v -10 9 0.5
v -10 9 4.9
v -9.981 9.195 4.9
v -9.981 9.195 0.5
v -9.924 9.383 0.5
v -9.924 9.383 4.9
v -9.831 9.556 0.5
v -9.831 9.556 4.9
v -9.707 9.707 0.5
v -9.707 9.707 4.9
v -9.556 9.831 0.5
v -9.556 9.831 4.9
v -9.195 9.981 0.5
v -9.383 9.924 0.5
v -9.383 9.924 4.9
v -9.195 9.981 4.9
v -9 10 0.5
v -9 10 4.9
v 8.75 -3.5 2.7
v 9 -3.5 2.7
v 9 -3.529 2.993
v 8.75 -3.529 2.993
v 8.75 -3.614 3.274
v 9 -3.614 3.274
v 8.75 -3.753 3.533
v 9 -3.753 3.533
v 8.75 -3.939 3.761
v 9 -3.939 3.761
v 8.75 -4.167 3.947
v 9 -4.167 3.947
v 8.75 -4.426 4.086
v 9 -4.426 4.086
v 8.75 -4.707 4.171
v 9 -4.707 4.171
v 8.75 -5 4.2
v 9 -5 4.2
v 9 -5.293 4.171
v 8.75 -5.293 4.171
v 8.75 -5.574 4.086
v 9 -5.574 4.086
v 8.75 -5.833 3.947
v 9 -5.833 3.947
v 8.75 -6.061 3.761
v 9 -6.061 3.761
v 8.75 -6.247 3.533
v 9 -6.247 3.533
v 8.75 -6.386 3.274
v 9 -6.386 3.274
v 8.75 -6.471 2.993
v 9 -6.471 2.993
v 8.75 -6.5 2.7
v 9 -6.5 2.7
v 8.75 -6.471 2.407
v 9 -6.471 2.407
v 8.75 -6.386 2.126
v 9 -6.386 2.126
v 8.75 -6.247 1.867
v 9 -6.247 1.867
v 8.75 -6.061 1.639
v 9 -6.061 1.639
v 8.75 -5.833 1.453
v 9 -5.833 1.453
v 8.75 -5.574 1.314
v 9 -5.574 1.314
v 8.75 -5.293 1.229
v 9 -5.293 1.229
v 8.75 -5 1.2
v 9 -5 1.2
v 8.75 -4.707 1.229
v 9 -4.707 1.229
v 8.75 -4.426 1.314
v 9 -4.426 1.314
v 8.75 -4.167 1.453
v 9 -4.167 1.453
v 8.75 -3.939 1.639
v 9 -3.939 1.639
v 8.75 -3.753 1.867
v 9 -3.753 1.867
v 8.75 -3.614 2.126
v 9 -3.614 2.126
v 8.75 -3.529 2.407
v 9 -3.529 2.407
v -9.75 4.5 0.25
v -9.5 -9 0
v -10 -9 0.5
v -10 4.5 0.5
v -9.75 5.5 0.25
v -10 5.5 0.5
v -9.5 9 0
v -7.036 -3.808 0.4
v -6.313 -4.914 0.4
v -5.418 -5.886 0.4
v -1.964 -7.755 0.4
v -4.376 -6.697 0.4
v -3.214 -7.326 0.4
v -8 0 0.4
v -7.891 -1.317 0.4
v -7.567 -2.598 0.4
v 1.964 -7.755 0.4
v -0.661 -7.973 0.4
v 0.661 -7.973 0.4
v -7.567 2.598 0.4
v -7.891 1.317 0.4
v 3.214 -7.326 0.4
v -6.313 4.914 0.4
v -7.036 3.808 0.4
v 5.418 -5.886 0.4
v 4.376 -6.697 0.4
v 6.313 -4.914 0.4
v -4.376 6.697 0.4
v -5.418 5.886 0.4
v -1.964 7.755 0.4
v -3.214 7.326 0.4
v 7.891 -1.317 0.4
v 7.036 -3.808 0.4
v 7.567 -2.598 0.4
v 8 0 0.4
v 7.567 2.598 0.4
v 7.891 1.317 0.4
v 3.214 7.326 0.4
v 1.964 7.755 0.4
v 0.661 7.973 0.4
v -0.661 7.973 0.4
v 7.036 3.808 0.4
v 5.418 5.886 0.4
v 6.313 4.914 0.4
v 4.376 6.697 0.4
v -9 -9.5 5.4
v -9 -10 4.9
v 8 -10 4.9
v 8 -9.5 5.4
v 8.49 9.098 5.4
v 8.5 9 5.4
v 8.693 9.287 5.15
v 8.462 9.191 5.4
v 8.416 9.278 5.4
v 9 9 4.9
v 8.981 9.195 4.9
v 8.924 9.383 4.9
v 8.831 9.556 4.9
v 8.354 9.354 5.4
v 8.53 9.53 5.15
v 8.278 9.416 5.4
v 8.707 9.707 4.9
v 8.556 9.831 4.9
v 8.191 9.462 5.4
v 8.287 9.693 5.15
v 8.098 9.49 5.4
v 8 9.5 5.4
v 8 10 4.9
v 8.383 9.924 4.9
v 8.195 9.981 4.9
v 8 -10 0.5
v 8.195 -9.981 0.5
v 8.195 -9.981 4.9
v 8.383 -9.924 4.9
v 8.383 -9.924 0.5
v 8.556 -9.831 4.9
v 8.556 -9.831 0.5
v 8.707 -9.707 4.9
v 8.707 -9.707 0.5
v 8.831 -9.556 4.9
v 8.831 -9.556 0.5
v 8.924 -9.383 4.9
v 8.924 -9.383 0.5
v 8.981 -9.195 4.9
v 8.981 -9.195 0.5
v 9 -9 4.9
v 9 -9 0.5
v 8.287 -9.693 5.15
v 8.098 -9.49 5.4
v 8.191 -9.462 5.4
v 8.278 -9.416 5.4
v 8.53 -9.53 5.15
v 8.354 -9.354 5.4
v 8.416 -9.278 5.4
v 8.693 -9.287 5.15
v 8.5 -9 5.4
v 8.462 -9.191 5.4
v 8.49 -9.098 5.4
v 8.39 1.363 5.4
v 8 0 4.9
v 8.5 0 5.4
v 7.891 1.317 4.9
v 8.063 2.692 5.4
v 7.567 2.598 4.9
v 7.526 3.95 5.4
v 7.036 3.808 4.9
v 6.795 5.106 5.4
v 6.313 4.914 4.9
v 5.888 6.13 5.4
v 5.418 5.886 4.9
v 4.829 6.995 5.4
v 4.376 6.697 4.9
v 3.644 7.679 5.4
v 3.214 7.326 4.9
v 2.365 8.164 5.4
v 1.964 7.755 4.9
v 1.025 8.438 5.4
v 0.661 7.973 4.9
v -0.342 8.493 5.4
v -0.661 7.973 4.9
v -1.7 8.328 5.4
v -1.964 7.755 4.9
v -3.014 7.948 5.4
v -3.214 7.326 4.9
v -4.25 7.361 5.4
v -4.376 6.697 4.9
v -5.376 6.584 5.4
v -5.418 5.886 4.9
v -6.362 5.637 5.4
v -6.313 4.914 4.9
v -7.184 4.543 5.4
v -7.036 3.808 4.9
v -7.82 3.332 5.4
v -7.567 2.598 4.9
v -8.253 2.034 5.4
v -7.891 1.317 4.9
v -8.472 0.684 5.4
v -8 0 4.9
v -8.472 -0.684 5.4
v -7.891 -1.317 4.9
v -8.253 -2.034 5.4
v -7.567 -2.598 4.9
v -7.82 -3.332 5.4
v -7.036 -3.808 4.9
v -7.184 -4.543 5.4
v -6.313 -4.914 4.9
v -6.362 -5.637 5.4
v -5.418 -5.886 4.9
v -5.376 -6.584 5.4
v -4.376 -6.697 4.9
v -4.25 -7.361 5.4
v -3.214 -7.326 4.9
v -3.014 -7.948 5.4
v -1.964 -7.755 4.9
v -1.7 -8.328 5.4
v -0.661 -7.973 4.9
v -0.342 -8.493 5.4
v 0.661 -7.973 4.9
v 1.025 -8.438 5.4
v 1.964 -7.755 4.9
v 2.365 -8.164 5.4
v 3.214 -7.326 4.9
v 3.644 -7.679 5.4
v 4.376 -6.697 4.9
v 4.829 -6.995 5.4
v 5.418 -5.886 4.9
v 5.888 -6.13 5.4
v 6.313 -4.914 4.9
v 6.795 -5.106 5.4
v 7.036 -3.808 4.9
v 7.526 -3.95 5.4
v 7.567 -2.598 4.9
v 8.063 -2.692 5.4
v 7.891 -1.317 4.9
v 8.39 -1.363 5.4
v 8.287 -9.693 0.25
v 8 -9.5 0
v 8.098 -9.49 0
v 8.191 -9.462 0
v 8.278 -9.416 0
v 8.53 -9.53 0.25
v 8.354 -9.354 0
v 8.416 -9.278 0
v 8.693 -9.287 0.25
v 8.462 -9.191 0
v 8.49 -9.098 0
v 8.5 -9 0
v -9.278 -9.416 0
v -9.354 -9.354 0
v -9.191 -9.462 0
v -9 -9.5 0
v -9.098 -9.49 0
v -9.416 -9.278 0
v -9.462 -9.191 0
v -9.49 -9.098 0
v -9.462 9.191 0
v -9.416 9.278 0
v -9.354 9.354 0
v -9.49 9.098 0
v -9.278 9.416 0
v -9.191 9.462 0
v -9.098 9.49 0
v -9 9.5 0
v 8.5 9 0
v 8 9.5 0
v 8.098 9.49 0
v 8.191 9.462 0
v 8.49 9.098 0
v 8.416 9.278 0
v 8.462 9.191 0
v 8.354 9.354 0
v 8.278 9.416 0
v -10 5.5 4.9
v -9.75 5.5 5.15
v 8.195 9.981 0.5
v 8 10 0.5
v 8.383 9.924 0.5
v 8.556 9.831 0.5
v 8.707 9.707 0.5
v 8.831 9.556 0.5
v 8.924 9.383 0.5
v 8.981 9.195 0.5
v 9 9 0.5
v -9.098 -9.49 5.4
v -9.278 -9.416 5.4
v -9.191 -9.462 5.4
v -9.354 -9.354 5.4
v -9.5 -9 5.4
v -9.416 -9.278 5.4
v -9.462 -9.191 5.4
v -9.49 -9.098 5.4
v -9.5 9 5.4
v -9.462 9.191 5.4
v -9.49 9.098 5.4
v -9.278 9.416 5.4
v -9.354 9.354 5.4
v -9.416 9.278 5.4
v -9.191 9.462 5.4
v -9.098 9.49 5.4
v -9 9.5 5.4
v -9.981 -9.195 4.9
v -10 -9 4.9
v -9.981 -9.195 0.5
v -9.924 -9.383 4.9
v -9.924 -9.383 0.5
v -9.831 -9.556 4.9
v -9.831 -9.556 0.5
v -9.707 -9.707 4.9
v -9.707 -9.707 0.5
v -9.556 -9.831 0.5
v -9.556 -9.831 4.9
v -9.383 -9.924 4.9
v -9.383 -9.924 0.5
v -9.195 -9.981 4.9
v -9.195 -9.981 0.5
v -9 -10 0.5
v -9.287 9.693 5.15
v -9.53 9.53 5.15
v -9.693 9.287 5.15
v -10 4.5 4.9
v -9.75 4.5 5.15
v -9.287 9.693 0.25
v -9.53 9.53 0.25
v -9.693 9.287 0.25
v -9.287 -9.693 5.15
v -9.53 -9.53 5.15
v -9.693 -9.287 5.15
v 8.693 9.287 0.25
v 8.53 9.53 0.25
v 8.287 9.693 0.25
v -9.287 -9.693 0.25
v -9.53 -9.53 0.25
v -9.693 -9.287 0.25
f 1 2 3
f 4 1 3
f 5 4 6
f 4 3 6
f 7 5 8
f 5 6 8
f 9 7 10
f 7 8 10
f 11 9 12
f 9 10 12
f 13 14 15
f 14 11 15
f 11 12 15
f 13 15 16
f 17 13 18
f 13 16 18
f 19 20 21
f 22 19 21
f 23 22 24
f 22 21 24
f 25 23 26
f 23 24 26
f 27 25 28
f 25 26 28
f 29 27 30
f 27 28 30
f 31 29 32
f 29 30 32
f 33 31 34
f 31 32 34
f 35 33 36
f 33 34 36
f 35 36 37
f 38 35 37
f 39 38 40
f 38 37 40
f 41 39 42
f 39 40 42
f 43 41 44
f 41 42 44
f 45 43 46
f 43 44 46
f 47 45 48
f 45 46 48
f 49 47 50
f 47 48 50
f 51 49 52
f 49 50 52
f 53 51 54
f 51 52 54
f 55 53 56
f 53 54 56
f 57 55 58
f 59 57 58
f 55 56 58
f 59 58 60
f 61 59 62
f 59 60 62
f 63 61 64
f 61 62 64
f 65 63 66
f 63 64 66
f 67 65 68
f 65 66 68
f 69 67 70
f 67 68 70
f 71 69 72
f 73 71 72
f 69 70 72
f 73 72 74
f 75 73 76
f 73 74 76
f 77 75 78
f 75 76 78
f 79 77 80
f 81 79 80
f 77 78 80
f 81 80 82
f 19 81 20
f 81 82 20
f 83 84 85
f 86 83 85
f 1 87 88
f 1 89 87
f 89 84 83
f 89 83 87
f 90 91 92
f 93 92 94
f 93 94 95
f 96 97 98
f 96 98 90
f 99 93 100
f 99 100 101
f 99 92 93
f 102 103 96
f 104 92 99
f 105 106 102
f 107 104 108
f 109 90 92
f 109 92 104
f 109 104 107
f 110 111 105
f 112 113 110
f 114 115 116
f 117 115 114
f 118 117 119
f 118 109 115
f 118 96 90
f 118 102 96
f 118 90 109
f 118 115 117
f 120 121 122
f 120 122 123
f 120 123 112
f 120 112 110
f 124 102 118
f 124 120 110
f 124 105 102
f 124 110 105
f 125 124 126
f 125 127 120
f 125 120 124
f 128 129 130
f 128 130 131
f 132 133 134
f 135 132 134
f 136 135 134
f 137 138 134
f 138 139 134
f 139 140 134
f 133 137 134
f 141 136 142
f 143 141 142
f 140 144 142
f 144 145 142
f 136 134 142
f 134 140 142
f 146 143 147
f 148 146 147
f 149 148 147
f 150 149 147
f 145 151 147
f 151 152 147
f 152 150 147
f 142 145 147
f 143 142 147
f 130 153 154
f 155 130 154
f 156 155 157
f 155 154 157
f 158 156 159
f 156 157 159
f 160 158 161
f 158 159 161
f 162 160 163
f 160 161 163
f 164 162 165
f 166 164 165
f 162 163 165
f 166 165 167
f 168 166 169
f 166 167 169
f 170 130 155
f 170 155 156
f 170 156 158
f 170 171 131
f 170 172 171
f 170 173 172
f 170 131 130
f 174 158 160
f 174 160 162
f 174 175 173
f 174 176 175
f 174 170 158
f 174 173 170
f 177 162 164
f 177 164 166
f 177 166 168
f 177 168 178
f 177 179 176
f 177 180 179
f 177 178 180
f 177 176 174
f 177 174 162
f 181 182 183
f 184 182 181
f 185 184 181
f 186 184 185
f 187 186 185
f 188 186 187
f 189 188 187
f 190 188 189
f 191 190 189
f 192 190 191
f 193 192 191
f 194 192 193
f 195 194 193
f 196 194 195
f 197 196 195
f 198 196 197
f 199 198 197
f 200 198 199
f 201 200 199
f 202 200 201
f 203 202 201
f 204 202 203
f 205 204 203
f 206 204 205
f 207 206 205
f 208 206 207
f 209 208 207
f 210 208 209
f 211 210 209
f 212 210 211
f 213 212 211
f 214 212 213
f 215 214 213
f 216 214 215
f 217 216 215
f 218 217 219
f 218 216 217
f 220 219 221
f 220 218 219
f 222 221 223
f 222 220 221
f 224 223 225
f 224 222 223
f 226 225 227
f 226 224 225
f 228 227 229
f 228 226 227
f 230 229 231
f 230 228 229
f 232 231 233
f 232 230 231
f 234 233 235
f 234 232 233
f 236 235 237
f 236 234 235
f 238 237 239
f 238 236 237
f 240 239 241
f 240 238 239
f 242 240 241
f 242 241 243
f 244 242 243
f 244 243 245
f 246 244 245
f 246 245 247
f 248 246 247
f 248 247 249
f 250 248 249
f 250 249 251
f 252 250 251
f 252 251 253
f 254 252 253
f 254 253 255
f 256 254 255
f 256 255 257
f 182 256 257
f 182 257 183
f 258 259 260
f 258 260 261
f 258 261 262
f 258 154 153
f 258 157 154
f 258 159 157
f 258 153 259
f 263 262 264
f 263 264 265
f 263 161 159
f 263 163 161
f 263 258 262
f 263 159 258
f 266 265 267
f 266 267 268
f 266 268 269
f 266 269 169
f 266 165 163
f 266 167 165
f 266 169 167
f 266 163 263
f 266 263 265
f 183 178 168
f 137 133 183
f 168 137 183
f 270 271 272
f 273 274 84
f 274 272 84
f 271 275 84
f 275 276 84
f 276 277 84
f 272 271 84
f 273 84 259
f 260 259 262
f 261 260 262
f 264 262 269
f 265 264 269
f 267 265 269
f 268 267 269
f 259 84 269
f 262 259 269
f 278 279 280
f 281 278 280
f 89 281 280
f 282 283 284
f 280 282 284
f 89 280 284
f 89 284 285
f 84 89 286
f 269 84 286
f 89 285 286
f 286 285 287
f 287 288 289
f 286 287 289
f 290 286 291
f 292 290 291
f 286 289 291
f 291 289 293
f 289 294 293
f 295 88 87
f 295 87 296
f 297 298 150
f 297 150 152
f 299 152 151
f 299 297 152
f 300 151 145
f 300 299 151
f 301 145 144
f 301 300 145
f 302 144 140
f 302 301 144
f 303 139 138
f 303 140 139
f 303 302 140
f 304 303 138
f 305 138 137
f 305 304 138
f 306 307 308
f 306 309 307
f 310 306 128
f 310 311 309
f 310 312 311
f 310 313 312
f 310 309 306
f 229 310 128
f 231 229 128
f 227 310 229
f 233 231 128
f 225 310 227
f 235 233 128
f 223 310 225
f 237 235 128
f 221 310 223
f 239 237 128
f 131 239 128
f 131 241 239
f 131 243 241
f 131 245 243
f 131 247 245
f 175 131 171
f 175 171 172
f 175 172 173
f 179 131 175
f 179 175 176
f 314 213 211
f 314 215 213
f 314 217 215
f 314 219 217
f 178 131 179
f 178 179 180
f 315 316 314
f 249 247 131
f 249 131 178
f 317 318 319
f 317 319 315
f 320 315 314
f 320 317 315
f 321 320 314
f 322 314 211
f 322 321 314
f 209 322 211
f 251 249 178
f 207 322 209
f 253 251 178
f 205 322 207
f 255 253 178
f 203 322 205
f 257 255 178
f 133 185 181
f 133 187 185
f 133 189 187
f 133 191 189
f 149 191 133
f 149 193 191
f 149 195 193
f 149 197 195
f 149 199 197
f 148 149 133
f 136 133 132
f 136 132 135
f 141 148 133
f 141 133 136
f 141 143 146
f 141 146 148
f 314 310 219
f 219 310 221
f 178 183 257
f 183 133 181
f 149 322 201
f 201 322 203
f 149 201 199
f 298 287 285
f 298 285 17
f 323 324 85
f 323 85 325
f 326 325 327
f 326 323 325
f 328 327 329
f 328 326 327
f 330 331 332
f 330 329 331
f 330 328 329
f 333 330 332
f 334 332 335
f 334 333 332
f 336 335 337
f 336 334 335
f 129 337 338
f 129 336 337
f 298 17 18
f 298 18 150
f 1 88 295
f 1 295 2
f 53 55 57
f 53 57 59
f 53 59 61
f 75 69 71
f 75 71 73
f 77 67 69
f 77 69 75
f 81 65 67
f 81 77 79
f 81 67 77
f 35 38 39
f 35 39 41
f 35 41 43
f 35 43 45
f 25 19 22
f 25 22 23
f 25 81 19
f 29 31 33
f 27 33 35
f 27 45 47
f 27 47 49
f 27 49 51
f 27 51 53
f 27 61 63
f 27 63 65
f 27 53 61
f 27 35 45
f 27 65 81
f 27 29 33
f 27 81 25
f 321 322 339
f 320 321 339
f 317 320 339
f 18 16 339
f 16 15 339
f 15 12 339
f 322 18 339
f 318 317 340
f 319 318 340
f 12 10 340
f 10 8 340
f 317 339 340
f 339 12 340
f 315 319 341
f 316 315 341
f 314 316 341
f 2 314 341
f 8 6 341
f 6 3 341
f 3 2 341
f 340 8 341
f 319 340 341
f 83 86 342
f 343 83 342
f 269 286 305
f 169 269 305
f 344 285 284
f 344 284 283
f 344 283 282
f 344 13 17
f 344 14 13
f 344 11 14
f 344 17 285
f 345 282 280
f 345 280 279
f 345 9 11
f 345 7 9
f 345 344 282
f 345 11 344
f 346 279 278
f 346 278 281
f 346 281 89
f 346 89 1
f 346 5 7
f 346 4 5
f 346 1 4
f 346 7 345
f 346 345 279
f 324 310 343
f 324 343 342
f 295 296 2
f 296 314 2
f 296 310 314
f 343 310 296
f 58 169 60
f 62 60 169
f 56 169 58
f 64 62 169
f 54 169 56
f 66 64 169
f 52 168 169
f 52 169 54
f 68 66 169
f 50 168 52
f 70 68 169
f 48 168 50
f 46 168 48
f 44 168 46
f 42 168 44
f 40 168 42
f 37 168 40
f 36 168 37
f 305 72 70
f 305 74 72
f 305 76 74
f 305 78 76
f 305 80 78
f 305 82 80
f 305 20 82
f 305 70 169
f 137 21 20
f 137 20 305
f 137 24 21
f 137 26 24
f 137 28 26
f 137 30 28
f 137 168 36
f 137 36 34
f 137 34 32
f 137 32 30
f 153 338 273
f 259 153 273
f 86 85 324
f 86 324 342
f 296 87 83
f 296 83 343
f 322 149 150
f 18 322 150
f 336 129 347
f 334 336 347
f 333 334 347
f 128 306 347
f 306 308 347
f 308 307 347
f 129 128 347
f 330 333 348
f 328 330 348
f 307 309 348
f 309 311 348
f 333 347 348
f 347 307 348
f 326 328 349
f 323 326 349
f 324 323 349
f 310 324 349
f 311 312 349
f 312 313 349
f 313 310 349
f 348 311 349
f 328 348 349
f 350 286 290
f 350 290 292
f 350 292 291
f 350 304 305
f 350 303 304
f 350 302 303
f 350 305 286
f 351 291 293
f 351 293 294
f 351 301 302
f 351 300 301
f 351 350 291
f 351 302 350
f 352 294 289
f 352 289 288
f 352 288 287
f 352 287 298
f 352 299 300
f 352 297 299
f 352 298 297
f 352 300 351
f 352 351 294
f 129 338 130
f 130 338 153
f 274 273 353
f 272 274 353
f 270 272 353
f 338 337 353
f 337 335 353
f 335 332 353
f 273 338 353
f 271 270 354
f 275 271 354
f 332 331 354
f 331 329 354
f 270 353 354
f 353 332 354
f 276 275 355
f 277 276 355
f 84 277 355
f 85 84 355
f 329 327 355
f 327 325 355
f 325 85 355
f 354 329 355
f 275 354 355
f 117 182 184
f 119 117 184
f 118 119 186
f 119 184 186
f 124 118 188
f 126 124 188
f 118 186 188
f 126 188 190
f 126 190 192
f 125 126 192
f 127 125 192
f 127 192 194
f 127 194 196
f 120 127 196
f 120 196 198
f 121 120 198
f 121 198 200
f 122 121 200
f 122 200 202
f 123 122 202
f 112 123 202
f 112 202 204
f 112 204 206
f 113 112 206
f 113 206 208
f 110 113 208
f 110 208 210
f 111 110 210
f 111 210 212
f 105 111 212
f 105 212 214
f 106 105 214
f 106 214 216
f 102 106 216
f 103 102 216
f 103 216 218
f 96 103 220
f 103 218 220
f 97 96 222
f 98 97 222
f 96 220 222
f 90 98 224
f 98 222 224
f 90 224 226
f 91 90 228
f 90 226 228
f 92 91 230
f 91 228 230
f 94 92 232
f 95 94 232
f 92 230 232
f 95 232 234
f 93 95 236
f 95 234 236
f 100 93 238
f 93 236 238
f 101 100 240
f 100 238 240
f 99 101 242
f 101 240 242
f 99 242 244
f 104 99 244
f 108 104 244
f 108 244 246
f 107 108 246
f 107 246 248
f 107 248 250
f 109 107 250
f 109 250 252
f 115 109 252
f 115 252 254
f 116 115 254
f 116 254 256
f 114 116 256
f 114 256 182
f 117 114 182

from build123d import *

# Parameters (mm, degrees)
SKETCH1_W           = 20
SKETCH1_H           = 20
BOSS_EXTRUDE1_DEPTH = 5.4
SKETCH2_R           = 8
CUT_EXTRUDE1_DEPTH  = 5
SKETCH4_W           = 1
SKETCH4_H           = 20
CUT_EXTRUDE3_DEPTH  = 10
SKETCH3_R           = 1.5
CUT_EXTRUDE2_DEPTH  = 0.25
SKETCH5_W           = 5.4
SKETCH5_H           = 1
CUT_EXTRUDE4_DEPTH  = 0.25
FILLET1_R           = 1
CHAMFER1_SIZE       = 0.5


with BuildPart() as part:
    # Sketch1 → Boss-Extrude1 (new body)
    with BuildSketch(Plane.XY):
        Rectangle(SKETCH1_W, SKETCH1_H)
    extrude(amount=BOSS_EXTRUDE1_DEPTH)

    # Sketch2 → Cut-Extrude1 (cut)
    with BuildSketch(Plane.XY.offset(5.4)):
        Circle(SKETCH2_R)
    extrude(amount=-CUT_EXTRUDE1_DEPTH, mode=Mode.SUBTRACT)

    # Sketch4 → Cut-Extrude3 (cut)
    with BuildSketch(Plane.XY.offset(5.4)):
        with Locations((9.5, 0)):
            Rectangle(SKETCH4_W, SKETCH4_H)
    extrude(amount=-CUT_EXTRUDE3_DEPTH, mode=Mode.SUBTRACT)

    # Sketch3 → Cut-Extrude2 (cut)
    with BuildSketch(Plane(origin=(9, 0, 0), x_dir=(0, 0, -1), z_dir=(1, 0, 0))):
        with Locations(Location((-2.7, -5, 0), (0, 0, 90))):
            Circle(SKETCH3_R)
    extrude(amount=-CUT_EXTRUDE2_DEPTH, mode=Mode.SUBTRACT)

    # Sketch5 → Cut-Extrude4 (cut)
    with BuildSketch(Plane.ZY.offset(10)):
        with Locations((2.7, 5)):
            Rectangle(SKETCH5_W, SKETCH5_H)
    extrude(amount=-CUT_EXTRUDE4_DEPTH, mode=Mode.SUBTRACT)

    # Fillet1
    fillet1_edges = [part.edges().sort_by_distance(p)[0] for p in [
        (9, -10, 2.7),
        (9, 10, 2.7),
        (-10, -10, 2.7),
        (-10, 10, 2.7),
    ]]
    fillet(fillet1_edges, radius=FILLET1_R)

    # Chamfer1
    # the kernel refuses this chamfer: 0.5 mm, written as the material it takes off along each edge
    with BuildSketch(Plane(origin=(8, 10, 0), x_dir=(0, -0.9996219169112968, -0.02749587661058639), z_dir=(-1, 0, 0)), Plane(origin=(-9, -10, 5.4), x_dir=(0, -0.027495876610585647, -0.9996219169112968), z_dir=(1, 0, 0))) as chamfer1_piece_1:
        Polygon((CHAMFER1_SIZE * 0.999621916911, CHAMFER1_SIZE * 0.0274958766106), (-CHAMFER1_SIZE * 0.0274958766106, CHAMFER1_SIZE * 0.999621916911), (0, 0), align=None)
    extrude(amount=17, mode=Mode.SUBTRACT)
    with BuildSketch(Plane(origin=(-9, 9, 0), x_dir=(0, 1, 0), z_dir=(1, 0, 0))) as chamfer1_piece_2:
        Polygon((1 - CHAMFER1_SIZE, 0), (1, CHAMFER1_SIZE), (1, 0), align=None)
    revolve(axis=Axis((-9, 9, 0), (0, 0, 1)), revolution_arc=90, mode=Mode.SUBTRACT)
    with BuildSketch(Plane(origin=(-10, 5.785841494, 0), x_dir=(0.9996219169112968, 0, -0.02749587661058639), z_dir=(0, -1, 0))) as chamfer1_piece_3:
        Polygon((CHAMFER1_SIZE * 0.999621916911, CHAMFER1_SIZE * 0.0274958766106), (-CHAMFER1_SIZE * 0.0274958766106, CHAMFER1_SIZE * 0.999621916911), (0, 0), align=None)
    extrude(amount=14.785841494, mode=Mode.SUBTRACT)
    with BuildSketch(Plane(origin=(-10, 9, 0), x_dir=(0.9996219169112968, 0, -0.02749587661058639), z_dir=(0, -1, 0))) as chamfer1_piece_4:
        Polygon((CHAMFER1_SIZE * 0.999621916911, CHAMFER1_SIZE * 0.0274958766106), (-CHAMFER1_SIZE * 0.0274958766106, CHAMFER1_SIZE * 0.999621916911), (0, 0), align=None)
    extrude(amount=4.785841494, mode=Mode.SUBTRACT)
    with BuildSketch(Plane(origin=(-9, -9, 0), x_dir=(0, -1, 0), z_dir=(1, 0, 0))) as chamfer1_piece_5:
        Polygon((1 - CHAMFER1_SIZE, 0), (1, -CHAMFER1_SIZE), (1, 0), align=None)
    revolve(axis=Axis((-9, -9, 0), (0, 0, -1)), revolution_arc=90, mode=Mode.SUBTRACT)
    with BuildSketch(Plane(origin=(-9, -10, 0), x_dir=(0, -0.02749587661058563, 0.9996219169112968), z_dir=(1, 0, 0)), Plane(origin=(8, 10, 5.4), x_dir=(0, -0.9996219169112968, 0.027495876610585647), z_dir=(-1, 0, 0))) as chamfer1_piece_6:
        Polygon((CHAMFER1_SIZE * 0.999621916911, -CHAMFER1_SIZE * 0.0274958766106), (-CHAMFER1_SIZE * 0.0274958766106, -CHAMFER1_SIZE * 0.999621916911), (0, 0), align=None)
    extrude(amount=17, mode=Mode.SUBTRACT)
    with BuildSketch(Plane(origin=(-9, -9, 5.4), x_dir=(0, -1, 0), z_dir=(1, 0, 0))) as chamfer1_piece_7:
        Polygon((1, CHAMFER1_SIZE), (1 - CHAMFER1_SIZE, 0), (1, 0), align=None)
    revolve(axis=Axis((-9, -9, 5.4), (0, 0, -1)), revolution_arc=90, mode=Mode.SUBTRACT)
    with BuildSketch(Plane(origin=(-10, 9, 5.4), x_dir=(0.9996219169112968, 0, 0.027495876610585647), z_dir=(0, -1, 0))) as chamfer1_piece_8:
        Polygon((CHAMFER1_SIZE * 0.999621916911, -CHAMFER1_SIZE * 0.0274958766106), (-CHAMFER1_SIZE * 0.0274958766106, -CHAMFER1_SIZE * 0.999621916911), (0, 0), align=None)
    extrude(amount=4.785841494, mode=Mode.SUBTRACT)
    with BuildSketch(Plane(origin=(-10, 5.785841494, 5.4), x_dir=(0.9996219169112968, 0, 0.027495876610585647), z_dir=(0, -1, 0))) as chamfer1_piece_9:
        Polygon((CHAMFER1_SIZE * 0.999621916911, -CHAMFER1_SIZE * 0.0274958766106), (-CHAMFER1_SIZE * 0.0274958766106, -CHAMFER1_SIZE * 0.999621916911), (0, 0), align=None)
    extrude(amount=14.785841494, mode=Mode.SUBTRACT)
    with BuildSketch(Plane(origin=(-9, 9, 5.4), x_dir=(0, 1, 0), z_dir=(1, 0, 0))) as chamfer1_piece_10:
        Polygon((1 - CHAMFER1_SIZE, 0), (1, -CHAMFER1_SIZE), (1, 0), align=None)
    revolve(axis=Axis((-9, 9, 5.4), (0, 0, 1)), revolution_arc=90, mode=Mode.SUBTRACT)
    with BuildSketch(Plane(origin=(0, 0, 5.4), x_dir=(1, 0, 0), z_dir=(0, -1, 0))) as chamfer1_piece_11:
        Polygon((8 + CHAMFER1_SIZE, 0), (8, -CHAMFER1_SIZE), (8, 0), align=None)
    revolve(axis=Axis((0, 0, 5.4), (0, 0, 1)), mode=Mode.SUBTRACT)
    with BuildSketch(Plane(origin=(9, 9, 0), x_dir=(-0.9996219169112968, 0, -0.02749587661058639), z_dir=(0, -1, 0))) as chamfer1_piece_12:
        Polygon((CHAMFER1_SIZE * 0.999621916911, -CHAMFER1_SIZE * 0.0274958766106), (-CHAMFER1_SIZE * 0.0274958766106, -CHAMFER1_SIZE * 0.999621916911), (0, 0), align=None)
    extrude(amount=18, mode=Mode.SUBTRACT)
    with BuildSketch(Plane(origin=(9, 9, 5.4), x_dir=(-0.9996219169112968, 0, 0.027495876610585647), z_dir=(0, -1, 0))) as chamfer1_piece_13:
        Polygon((CHAMFER1_SIZE * 0.999621916911, CHAMFER1_SIZE * 0.0274958766106), (-CHAMFER1_SIZE * 0.0274958766106, CHAMFER1_SIZE * 0.999621916911), (0, 0), align=None)
    extrude(amount=18, mode=Mode.SUBTRACT)
    with BuildSketch(Plane(origin=(8, 9, 0), x_dir=(1, 0, 0), z_dir=(0, -1, 0))) as chamfer1_piece_14:
        Polygon((1 - CHAMFER1_SIZE, 0), (1, CHAMFER1_SIZE), (1, 0), align=None)
    revolve(axis=Axis((8, 9, 0), (0, 0, 1)), revolution_arc=90, mode=Mode.SUBTRACT)
    with BuildSketch(Plane(origin=(8, -9, 0), x_dir=(0, -1, 0), z_dir=(-1, 0, 0))) as chamfer1_piece_15:
        Polygon((1 - CHAMFER1_SIZE, 0), (1, CHAMFER1_SIZE), (1, 0), align=None)
    revolve(axis=Axis((8, -9, 0), (0, 0, 1)), revolution_arc=90, mode=Mode.SUBTRACT)
    with BuildSketch(Plane(origin=(8, 9, 5.4), x_dir=(1, 0, 0), z_dir=(0, -1, 0))) as chamfer1_piece_16:
        Polygon((1 - CHAMFER1_SIZE, 0), (1, -CHAMFER1_SIZE), (1, 0), align=None)
    revolve(axis=Axis((8, 9, 5.4), (0, 0, 1)), revolution_arc=90, mode=Mode.SUBTRACT)
    with BuildSketch(Plane(origin=(8, -9, 5.4), x_dir=(0, -1, 0), z_dir=(-1, 0, 0))) as chamfer1_piece_17:
        Polygon((1, -CHAMFER1_SIZE), (1 - CHAMFER1_SIZE, 0), (1, 0), align=None)
    revolve(axis=Axis((8, -9, 5.4), (0, 0, 1)), revolution_arc=90, mode=Mode.SUBTRACT)


solid = part.part
